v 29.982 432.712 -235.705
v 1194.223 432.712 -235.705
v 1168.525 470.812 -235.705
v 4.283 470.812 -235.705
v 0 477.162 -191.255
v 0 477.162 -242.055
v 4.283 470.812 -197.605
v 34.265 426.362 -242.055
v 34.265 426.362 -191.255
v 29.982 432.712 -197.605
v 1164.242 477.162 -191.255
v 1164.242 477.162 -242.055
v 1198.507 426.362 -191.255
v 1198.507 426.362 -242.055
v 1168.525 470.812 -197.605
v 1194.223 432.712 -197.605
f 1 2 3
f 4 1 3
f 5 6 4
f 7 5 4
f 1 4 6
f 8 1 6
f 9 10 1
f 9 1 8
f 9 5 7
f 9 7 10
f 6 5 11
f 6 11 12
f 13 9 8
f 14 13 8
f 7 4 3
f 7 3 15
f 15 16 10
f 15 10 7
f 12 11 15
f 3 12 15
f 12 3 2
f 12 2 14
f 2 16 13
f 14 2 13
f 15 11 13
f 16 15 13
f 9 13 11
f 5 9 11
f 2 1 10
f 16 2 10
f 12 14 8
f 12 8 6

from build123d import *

# Parameters (mm, degrees)
SKETCH2_W           = 50.8
SKETCH2_H           = 50.8
BOSS_EXTRUDE1_DEPTH = 1930.4
SKETCH4_W           = 38.1
SKETCH4_H           = 38.1
CUT_EXTRUDE1_DEPTH  = 2004.17710002
CUT_EXTRUDE2_DEPTH  = 1990.147718313


with BuildPart() as part:
    # Sketch2 → Boss-Extrude1 (new body)
    with BuildSketch(Plane(origin=(0, 0, 0), x_dir=(0, 0, -1), z_dir=(1, 0, 0))):
        with Locations((216.654722693, 451.762283996)):
            Rectangle(SKETCH2_W, SKETCH2_H)
    extrude(amount=BOSS_EXTRUDE1_DEPTH)

    # Sketch4 → Cut-Extrude1 (cut, through all)
    with BuildSketch(Plane.ZY):
        with Locations((-216.654722693, 451.762283996)):
            Rectangle(SKETCH4_W, SKETCH4_H)
    extrude(amount=-CUT_EXTRUDE1_DEPTH, mode=Mode.SUBTRACT)

    # Sketch5 → Cut-Extrude2 (cut, through all)
    with BuildSketch(Plane.XY.offset(-191.254722693)):
        Polygon((0, 477.162283996), (34.265032656, 426.362283996), (0, 426.362283996), align=None)
        Polygon((1164.241563896, 477.162283996), (1930.4, -658.714309068), (1930.4, 477.162283996), align=None)
    extrude(amount=-CUT_EXTRUDE2_DEPTH, mode=Mode.SUBTRACT)


solid = part.part
